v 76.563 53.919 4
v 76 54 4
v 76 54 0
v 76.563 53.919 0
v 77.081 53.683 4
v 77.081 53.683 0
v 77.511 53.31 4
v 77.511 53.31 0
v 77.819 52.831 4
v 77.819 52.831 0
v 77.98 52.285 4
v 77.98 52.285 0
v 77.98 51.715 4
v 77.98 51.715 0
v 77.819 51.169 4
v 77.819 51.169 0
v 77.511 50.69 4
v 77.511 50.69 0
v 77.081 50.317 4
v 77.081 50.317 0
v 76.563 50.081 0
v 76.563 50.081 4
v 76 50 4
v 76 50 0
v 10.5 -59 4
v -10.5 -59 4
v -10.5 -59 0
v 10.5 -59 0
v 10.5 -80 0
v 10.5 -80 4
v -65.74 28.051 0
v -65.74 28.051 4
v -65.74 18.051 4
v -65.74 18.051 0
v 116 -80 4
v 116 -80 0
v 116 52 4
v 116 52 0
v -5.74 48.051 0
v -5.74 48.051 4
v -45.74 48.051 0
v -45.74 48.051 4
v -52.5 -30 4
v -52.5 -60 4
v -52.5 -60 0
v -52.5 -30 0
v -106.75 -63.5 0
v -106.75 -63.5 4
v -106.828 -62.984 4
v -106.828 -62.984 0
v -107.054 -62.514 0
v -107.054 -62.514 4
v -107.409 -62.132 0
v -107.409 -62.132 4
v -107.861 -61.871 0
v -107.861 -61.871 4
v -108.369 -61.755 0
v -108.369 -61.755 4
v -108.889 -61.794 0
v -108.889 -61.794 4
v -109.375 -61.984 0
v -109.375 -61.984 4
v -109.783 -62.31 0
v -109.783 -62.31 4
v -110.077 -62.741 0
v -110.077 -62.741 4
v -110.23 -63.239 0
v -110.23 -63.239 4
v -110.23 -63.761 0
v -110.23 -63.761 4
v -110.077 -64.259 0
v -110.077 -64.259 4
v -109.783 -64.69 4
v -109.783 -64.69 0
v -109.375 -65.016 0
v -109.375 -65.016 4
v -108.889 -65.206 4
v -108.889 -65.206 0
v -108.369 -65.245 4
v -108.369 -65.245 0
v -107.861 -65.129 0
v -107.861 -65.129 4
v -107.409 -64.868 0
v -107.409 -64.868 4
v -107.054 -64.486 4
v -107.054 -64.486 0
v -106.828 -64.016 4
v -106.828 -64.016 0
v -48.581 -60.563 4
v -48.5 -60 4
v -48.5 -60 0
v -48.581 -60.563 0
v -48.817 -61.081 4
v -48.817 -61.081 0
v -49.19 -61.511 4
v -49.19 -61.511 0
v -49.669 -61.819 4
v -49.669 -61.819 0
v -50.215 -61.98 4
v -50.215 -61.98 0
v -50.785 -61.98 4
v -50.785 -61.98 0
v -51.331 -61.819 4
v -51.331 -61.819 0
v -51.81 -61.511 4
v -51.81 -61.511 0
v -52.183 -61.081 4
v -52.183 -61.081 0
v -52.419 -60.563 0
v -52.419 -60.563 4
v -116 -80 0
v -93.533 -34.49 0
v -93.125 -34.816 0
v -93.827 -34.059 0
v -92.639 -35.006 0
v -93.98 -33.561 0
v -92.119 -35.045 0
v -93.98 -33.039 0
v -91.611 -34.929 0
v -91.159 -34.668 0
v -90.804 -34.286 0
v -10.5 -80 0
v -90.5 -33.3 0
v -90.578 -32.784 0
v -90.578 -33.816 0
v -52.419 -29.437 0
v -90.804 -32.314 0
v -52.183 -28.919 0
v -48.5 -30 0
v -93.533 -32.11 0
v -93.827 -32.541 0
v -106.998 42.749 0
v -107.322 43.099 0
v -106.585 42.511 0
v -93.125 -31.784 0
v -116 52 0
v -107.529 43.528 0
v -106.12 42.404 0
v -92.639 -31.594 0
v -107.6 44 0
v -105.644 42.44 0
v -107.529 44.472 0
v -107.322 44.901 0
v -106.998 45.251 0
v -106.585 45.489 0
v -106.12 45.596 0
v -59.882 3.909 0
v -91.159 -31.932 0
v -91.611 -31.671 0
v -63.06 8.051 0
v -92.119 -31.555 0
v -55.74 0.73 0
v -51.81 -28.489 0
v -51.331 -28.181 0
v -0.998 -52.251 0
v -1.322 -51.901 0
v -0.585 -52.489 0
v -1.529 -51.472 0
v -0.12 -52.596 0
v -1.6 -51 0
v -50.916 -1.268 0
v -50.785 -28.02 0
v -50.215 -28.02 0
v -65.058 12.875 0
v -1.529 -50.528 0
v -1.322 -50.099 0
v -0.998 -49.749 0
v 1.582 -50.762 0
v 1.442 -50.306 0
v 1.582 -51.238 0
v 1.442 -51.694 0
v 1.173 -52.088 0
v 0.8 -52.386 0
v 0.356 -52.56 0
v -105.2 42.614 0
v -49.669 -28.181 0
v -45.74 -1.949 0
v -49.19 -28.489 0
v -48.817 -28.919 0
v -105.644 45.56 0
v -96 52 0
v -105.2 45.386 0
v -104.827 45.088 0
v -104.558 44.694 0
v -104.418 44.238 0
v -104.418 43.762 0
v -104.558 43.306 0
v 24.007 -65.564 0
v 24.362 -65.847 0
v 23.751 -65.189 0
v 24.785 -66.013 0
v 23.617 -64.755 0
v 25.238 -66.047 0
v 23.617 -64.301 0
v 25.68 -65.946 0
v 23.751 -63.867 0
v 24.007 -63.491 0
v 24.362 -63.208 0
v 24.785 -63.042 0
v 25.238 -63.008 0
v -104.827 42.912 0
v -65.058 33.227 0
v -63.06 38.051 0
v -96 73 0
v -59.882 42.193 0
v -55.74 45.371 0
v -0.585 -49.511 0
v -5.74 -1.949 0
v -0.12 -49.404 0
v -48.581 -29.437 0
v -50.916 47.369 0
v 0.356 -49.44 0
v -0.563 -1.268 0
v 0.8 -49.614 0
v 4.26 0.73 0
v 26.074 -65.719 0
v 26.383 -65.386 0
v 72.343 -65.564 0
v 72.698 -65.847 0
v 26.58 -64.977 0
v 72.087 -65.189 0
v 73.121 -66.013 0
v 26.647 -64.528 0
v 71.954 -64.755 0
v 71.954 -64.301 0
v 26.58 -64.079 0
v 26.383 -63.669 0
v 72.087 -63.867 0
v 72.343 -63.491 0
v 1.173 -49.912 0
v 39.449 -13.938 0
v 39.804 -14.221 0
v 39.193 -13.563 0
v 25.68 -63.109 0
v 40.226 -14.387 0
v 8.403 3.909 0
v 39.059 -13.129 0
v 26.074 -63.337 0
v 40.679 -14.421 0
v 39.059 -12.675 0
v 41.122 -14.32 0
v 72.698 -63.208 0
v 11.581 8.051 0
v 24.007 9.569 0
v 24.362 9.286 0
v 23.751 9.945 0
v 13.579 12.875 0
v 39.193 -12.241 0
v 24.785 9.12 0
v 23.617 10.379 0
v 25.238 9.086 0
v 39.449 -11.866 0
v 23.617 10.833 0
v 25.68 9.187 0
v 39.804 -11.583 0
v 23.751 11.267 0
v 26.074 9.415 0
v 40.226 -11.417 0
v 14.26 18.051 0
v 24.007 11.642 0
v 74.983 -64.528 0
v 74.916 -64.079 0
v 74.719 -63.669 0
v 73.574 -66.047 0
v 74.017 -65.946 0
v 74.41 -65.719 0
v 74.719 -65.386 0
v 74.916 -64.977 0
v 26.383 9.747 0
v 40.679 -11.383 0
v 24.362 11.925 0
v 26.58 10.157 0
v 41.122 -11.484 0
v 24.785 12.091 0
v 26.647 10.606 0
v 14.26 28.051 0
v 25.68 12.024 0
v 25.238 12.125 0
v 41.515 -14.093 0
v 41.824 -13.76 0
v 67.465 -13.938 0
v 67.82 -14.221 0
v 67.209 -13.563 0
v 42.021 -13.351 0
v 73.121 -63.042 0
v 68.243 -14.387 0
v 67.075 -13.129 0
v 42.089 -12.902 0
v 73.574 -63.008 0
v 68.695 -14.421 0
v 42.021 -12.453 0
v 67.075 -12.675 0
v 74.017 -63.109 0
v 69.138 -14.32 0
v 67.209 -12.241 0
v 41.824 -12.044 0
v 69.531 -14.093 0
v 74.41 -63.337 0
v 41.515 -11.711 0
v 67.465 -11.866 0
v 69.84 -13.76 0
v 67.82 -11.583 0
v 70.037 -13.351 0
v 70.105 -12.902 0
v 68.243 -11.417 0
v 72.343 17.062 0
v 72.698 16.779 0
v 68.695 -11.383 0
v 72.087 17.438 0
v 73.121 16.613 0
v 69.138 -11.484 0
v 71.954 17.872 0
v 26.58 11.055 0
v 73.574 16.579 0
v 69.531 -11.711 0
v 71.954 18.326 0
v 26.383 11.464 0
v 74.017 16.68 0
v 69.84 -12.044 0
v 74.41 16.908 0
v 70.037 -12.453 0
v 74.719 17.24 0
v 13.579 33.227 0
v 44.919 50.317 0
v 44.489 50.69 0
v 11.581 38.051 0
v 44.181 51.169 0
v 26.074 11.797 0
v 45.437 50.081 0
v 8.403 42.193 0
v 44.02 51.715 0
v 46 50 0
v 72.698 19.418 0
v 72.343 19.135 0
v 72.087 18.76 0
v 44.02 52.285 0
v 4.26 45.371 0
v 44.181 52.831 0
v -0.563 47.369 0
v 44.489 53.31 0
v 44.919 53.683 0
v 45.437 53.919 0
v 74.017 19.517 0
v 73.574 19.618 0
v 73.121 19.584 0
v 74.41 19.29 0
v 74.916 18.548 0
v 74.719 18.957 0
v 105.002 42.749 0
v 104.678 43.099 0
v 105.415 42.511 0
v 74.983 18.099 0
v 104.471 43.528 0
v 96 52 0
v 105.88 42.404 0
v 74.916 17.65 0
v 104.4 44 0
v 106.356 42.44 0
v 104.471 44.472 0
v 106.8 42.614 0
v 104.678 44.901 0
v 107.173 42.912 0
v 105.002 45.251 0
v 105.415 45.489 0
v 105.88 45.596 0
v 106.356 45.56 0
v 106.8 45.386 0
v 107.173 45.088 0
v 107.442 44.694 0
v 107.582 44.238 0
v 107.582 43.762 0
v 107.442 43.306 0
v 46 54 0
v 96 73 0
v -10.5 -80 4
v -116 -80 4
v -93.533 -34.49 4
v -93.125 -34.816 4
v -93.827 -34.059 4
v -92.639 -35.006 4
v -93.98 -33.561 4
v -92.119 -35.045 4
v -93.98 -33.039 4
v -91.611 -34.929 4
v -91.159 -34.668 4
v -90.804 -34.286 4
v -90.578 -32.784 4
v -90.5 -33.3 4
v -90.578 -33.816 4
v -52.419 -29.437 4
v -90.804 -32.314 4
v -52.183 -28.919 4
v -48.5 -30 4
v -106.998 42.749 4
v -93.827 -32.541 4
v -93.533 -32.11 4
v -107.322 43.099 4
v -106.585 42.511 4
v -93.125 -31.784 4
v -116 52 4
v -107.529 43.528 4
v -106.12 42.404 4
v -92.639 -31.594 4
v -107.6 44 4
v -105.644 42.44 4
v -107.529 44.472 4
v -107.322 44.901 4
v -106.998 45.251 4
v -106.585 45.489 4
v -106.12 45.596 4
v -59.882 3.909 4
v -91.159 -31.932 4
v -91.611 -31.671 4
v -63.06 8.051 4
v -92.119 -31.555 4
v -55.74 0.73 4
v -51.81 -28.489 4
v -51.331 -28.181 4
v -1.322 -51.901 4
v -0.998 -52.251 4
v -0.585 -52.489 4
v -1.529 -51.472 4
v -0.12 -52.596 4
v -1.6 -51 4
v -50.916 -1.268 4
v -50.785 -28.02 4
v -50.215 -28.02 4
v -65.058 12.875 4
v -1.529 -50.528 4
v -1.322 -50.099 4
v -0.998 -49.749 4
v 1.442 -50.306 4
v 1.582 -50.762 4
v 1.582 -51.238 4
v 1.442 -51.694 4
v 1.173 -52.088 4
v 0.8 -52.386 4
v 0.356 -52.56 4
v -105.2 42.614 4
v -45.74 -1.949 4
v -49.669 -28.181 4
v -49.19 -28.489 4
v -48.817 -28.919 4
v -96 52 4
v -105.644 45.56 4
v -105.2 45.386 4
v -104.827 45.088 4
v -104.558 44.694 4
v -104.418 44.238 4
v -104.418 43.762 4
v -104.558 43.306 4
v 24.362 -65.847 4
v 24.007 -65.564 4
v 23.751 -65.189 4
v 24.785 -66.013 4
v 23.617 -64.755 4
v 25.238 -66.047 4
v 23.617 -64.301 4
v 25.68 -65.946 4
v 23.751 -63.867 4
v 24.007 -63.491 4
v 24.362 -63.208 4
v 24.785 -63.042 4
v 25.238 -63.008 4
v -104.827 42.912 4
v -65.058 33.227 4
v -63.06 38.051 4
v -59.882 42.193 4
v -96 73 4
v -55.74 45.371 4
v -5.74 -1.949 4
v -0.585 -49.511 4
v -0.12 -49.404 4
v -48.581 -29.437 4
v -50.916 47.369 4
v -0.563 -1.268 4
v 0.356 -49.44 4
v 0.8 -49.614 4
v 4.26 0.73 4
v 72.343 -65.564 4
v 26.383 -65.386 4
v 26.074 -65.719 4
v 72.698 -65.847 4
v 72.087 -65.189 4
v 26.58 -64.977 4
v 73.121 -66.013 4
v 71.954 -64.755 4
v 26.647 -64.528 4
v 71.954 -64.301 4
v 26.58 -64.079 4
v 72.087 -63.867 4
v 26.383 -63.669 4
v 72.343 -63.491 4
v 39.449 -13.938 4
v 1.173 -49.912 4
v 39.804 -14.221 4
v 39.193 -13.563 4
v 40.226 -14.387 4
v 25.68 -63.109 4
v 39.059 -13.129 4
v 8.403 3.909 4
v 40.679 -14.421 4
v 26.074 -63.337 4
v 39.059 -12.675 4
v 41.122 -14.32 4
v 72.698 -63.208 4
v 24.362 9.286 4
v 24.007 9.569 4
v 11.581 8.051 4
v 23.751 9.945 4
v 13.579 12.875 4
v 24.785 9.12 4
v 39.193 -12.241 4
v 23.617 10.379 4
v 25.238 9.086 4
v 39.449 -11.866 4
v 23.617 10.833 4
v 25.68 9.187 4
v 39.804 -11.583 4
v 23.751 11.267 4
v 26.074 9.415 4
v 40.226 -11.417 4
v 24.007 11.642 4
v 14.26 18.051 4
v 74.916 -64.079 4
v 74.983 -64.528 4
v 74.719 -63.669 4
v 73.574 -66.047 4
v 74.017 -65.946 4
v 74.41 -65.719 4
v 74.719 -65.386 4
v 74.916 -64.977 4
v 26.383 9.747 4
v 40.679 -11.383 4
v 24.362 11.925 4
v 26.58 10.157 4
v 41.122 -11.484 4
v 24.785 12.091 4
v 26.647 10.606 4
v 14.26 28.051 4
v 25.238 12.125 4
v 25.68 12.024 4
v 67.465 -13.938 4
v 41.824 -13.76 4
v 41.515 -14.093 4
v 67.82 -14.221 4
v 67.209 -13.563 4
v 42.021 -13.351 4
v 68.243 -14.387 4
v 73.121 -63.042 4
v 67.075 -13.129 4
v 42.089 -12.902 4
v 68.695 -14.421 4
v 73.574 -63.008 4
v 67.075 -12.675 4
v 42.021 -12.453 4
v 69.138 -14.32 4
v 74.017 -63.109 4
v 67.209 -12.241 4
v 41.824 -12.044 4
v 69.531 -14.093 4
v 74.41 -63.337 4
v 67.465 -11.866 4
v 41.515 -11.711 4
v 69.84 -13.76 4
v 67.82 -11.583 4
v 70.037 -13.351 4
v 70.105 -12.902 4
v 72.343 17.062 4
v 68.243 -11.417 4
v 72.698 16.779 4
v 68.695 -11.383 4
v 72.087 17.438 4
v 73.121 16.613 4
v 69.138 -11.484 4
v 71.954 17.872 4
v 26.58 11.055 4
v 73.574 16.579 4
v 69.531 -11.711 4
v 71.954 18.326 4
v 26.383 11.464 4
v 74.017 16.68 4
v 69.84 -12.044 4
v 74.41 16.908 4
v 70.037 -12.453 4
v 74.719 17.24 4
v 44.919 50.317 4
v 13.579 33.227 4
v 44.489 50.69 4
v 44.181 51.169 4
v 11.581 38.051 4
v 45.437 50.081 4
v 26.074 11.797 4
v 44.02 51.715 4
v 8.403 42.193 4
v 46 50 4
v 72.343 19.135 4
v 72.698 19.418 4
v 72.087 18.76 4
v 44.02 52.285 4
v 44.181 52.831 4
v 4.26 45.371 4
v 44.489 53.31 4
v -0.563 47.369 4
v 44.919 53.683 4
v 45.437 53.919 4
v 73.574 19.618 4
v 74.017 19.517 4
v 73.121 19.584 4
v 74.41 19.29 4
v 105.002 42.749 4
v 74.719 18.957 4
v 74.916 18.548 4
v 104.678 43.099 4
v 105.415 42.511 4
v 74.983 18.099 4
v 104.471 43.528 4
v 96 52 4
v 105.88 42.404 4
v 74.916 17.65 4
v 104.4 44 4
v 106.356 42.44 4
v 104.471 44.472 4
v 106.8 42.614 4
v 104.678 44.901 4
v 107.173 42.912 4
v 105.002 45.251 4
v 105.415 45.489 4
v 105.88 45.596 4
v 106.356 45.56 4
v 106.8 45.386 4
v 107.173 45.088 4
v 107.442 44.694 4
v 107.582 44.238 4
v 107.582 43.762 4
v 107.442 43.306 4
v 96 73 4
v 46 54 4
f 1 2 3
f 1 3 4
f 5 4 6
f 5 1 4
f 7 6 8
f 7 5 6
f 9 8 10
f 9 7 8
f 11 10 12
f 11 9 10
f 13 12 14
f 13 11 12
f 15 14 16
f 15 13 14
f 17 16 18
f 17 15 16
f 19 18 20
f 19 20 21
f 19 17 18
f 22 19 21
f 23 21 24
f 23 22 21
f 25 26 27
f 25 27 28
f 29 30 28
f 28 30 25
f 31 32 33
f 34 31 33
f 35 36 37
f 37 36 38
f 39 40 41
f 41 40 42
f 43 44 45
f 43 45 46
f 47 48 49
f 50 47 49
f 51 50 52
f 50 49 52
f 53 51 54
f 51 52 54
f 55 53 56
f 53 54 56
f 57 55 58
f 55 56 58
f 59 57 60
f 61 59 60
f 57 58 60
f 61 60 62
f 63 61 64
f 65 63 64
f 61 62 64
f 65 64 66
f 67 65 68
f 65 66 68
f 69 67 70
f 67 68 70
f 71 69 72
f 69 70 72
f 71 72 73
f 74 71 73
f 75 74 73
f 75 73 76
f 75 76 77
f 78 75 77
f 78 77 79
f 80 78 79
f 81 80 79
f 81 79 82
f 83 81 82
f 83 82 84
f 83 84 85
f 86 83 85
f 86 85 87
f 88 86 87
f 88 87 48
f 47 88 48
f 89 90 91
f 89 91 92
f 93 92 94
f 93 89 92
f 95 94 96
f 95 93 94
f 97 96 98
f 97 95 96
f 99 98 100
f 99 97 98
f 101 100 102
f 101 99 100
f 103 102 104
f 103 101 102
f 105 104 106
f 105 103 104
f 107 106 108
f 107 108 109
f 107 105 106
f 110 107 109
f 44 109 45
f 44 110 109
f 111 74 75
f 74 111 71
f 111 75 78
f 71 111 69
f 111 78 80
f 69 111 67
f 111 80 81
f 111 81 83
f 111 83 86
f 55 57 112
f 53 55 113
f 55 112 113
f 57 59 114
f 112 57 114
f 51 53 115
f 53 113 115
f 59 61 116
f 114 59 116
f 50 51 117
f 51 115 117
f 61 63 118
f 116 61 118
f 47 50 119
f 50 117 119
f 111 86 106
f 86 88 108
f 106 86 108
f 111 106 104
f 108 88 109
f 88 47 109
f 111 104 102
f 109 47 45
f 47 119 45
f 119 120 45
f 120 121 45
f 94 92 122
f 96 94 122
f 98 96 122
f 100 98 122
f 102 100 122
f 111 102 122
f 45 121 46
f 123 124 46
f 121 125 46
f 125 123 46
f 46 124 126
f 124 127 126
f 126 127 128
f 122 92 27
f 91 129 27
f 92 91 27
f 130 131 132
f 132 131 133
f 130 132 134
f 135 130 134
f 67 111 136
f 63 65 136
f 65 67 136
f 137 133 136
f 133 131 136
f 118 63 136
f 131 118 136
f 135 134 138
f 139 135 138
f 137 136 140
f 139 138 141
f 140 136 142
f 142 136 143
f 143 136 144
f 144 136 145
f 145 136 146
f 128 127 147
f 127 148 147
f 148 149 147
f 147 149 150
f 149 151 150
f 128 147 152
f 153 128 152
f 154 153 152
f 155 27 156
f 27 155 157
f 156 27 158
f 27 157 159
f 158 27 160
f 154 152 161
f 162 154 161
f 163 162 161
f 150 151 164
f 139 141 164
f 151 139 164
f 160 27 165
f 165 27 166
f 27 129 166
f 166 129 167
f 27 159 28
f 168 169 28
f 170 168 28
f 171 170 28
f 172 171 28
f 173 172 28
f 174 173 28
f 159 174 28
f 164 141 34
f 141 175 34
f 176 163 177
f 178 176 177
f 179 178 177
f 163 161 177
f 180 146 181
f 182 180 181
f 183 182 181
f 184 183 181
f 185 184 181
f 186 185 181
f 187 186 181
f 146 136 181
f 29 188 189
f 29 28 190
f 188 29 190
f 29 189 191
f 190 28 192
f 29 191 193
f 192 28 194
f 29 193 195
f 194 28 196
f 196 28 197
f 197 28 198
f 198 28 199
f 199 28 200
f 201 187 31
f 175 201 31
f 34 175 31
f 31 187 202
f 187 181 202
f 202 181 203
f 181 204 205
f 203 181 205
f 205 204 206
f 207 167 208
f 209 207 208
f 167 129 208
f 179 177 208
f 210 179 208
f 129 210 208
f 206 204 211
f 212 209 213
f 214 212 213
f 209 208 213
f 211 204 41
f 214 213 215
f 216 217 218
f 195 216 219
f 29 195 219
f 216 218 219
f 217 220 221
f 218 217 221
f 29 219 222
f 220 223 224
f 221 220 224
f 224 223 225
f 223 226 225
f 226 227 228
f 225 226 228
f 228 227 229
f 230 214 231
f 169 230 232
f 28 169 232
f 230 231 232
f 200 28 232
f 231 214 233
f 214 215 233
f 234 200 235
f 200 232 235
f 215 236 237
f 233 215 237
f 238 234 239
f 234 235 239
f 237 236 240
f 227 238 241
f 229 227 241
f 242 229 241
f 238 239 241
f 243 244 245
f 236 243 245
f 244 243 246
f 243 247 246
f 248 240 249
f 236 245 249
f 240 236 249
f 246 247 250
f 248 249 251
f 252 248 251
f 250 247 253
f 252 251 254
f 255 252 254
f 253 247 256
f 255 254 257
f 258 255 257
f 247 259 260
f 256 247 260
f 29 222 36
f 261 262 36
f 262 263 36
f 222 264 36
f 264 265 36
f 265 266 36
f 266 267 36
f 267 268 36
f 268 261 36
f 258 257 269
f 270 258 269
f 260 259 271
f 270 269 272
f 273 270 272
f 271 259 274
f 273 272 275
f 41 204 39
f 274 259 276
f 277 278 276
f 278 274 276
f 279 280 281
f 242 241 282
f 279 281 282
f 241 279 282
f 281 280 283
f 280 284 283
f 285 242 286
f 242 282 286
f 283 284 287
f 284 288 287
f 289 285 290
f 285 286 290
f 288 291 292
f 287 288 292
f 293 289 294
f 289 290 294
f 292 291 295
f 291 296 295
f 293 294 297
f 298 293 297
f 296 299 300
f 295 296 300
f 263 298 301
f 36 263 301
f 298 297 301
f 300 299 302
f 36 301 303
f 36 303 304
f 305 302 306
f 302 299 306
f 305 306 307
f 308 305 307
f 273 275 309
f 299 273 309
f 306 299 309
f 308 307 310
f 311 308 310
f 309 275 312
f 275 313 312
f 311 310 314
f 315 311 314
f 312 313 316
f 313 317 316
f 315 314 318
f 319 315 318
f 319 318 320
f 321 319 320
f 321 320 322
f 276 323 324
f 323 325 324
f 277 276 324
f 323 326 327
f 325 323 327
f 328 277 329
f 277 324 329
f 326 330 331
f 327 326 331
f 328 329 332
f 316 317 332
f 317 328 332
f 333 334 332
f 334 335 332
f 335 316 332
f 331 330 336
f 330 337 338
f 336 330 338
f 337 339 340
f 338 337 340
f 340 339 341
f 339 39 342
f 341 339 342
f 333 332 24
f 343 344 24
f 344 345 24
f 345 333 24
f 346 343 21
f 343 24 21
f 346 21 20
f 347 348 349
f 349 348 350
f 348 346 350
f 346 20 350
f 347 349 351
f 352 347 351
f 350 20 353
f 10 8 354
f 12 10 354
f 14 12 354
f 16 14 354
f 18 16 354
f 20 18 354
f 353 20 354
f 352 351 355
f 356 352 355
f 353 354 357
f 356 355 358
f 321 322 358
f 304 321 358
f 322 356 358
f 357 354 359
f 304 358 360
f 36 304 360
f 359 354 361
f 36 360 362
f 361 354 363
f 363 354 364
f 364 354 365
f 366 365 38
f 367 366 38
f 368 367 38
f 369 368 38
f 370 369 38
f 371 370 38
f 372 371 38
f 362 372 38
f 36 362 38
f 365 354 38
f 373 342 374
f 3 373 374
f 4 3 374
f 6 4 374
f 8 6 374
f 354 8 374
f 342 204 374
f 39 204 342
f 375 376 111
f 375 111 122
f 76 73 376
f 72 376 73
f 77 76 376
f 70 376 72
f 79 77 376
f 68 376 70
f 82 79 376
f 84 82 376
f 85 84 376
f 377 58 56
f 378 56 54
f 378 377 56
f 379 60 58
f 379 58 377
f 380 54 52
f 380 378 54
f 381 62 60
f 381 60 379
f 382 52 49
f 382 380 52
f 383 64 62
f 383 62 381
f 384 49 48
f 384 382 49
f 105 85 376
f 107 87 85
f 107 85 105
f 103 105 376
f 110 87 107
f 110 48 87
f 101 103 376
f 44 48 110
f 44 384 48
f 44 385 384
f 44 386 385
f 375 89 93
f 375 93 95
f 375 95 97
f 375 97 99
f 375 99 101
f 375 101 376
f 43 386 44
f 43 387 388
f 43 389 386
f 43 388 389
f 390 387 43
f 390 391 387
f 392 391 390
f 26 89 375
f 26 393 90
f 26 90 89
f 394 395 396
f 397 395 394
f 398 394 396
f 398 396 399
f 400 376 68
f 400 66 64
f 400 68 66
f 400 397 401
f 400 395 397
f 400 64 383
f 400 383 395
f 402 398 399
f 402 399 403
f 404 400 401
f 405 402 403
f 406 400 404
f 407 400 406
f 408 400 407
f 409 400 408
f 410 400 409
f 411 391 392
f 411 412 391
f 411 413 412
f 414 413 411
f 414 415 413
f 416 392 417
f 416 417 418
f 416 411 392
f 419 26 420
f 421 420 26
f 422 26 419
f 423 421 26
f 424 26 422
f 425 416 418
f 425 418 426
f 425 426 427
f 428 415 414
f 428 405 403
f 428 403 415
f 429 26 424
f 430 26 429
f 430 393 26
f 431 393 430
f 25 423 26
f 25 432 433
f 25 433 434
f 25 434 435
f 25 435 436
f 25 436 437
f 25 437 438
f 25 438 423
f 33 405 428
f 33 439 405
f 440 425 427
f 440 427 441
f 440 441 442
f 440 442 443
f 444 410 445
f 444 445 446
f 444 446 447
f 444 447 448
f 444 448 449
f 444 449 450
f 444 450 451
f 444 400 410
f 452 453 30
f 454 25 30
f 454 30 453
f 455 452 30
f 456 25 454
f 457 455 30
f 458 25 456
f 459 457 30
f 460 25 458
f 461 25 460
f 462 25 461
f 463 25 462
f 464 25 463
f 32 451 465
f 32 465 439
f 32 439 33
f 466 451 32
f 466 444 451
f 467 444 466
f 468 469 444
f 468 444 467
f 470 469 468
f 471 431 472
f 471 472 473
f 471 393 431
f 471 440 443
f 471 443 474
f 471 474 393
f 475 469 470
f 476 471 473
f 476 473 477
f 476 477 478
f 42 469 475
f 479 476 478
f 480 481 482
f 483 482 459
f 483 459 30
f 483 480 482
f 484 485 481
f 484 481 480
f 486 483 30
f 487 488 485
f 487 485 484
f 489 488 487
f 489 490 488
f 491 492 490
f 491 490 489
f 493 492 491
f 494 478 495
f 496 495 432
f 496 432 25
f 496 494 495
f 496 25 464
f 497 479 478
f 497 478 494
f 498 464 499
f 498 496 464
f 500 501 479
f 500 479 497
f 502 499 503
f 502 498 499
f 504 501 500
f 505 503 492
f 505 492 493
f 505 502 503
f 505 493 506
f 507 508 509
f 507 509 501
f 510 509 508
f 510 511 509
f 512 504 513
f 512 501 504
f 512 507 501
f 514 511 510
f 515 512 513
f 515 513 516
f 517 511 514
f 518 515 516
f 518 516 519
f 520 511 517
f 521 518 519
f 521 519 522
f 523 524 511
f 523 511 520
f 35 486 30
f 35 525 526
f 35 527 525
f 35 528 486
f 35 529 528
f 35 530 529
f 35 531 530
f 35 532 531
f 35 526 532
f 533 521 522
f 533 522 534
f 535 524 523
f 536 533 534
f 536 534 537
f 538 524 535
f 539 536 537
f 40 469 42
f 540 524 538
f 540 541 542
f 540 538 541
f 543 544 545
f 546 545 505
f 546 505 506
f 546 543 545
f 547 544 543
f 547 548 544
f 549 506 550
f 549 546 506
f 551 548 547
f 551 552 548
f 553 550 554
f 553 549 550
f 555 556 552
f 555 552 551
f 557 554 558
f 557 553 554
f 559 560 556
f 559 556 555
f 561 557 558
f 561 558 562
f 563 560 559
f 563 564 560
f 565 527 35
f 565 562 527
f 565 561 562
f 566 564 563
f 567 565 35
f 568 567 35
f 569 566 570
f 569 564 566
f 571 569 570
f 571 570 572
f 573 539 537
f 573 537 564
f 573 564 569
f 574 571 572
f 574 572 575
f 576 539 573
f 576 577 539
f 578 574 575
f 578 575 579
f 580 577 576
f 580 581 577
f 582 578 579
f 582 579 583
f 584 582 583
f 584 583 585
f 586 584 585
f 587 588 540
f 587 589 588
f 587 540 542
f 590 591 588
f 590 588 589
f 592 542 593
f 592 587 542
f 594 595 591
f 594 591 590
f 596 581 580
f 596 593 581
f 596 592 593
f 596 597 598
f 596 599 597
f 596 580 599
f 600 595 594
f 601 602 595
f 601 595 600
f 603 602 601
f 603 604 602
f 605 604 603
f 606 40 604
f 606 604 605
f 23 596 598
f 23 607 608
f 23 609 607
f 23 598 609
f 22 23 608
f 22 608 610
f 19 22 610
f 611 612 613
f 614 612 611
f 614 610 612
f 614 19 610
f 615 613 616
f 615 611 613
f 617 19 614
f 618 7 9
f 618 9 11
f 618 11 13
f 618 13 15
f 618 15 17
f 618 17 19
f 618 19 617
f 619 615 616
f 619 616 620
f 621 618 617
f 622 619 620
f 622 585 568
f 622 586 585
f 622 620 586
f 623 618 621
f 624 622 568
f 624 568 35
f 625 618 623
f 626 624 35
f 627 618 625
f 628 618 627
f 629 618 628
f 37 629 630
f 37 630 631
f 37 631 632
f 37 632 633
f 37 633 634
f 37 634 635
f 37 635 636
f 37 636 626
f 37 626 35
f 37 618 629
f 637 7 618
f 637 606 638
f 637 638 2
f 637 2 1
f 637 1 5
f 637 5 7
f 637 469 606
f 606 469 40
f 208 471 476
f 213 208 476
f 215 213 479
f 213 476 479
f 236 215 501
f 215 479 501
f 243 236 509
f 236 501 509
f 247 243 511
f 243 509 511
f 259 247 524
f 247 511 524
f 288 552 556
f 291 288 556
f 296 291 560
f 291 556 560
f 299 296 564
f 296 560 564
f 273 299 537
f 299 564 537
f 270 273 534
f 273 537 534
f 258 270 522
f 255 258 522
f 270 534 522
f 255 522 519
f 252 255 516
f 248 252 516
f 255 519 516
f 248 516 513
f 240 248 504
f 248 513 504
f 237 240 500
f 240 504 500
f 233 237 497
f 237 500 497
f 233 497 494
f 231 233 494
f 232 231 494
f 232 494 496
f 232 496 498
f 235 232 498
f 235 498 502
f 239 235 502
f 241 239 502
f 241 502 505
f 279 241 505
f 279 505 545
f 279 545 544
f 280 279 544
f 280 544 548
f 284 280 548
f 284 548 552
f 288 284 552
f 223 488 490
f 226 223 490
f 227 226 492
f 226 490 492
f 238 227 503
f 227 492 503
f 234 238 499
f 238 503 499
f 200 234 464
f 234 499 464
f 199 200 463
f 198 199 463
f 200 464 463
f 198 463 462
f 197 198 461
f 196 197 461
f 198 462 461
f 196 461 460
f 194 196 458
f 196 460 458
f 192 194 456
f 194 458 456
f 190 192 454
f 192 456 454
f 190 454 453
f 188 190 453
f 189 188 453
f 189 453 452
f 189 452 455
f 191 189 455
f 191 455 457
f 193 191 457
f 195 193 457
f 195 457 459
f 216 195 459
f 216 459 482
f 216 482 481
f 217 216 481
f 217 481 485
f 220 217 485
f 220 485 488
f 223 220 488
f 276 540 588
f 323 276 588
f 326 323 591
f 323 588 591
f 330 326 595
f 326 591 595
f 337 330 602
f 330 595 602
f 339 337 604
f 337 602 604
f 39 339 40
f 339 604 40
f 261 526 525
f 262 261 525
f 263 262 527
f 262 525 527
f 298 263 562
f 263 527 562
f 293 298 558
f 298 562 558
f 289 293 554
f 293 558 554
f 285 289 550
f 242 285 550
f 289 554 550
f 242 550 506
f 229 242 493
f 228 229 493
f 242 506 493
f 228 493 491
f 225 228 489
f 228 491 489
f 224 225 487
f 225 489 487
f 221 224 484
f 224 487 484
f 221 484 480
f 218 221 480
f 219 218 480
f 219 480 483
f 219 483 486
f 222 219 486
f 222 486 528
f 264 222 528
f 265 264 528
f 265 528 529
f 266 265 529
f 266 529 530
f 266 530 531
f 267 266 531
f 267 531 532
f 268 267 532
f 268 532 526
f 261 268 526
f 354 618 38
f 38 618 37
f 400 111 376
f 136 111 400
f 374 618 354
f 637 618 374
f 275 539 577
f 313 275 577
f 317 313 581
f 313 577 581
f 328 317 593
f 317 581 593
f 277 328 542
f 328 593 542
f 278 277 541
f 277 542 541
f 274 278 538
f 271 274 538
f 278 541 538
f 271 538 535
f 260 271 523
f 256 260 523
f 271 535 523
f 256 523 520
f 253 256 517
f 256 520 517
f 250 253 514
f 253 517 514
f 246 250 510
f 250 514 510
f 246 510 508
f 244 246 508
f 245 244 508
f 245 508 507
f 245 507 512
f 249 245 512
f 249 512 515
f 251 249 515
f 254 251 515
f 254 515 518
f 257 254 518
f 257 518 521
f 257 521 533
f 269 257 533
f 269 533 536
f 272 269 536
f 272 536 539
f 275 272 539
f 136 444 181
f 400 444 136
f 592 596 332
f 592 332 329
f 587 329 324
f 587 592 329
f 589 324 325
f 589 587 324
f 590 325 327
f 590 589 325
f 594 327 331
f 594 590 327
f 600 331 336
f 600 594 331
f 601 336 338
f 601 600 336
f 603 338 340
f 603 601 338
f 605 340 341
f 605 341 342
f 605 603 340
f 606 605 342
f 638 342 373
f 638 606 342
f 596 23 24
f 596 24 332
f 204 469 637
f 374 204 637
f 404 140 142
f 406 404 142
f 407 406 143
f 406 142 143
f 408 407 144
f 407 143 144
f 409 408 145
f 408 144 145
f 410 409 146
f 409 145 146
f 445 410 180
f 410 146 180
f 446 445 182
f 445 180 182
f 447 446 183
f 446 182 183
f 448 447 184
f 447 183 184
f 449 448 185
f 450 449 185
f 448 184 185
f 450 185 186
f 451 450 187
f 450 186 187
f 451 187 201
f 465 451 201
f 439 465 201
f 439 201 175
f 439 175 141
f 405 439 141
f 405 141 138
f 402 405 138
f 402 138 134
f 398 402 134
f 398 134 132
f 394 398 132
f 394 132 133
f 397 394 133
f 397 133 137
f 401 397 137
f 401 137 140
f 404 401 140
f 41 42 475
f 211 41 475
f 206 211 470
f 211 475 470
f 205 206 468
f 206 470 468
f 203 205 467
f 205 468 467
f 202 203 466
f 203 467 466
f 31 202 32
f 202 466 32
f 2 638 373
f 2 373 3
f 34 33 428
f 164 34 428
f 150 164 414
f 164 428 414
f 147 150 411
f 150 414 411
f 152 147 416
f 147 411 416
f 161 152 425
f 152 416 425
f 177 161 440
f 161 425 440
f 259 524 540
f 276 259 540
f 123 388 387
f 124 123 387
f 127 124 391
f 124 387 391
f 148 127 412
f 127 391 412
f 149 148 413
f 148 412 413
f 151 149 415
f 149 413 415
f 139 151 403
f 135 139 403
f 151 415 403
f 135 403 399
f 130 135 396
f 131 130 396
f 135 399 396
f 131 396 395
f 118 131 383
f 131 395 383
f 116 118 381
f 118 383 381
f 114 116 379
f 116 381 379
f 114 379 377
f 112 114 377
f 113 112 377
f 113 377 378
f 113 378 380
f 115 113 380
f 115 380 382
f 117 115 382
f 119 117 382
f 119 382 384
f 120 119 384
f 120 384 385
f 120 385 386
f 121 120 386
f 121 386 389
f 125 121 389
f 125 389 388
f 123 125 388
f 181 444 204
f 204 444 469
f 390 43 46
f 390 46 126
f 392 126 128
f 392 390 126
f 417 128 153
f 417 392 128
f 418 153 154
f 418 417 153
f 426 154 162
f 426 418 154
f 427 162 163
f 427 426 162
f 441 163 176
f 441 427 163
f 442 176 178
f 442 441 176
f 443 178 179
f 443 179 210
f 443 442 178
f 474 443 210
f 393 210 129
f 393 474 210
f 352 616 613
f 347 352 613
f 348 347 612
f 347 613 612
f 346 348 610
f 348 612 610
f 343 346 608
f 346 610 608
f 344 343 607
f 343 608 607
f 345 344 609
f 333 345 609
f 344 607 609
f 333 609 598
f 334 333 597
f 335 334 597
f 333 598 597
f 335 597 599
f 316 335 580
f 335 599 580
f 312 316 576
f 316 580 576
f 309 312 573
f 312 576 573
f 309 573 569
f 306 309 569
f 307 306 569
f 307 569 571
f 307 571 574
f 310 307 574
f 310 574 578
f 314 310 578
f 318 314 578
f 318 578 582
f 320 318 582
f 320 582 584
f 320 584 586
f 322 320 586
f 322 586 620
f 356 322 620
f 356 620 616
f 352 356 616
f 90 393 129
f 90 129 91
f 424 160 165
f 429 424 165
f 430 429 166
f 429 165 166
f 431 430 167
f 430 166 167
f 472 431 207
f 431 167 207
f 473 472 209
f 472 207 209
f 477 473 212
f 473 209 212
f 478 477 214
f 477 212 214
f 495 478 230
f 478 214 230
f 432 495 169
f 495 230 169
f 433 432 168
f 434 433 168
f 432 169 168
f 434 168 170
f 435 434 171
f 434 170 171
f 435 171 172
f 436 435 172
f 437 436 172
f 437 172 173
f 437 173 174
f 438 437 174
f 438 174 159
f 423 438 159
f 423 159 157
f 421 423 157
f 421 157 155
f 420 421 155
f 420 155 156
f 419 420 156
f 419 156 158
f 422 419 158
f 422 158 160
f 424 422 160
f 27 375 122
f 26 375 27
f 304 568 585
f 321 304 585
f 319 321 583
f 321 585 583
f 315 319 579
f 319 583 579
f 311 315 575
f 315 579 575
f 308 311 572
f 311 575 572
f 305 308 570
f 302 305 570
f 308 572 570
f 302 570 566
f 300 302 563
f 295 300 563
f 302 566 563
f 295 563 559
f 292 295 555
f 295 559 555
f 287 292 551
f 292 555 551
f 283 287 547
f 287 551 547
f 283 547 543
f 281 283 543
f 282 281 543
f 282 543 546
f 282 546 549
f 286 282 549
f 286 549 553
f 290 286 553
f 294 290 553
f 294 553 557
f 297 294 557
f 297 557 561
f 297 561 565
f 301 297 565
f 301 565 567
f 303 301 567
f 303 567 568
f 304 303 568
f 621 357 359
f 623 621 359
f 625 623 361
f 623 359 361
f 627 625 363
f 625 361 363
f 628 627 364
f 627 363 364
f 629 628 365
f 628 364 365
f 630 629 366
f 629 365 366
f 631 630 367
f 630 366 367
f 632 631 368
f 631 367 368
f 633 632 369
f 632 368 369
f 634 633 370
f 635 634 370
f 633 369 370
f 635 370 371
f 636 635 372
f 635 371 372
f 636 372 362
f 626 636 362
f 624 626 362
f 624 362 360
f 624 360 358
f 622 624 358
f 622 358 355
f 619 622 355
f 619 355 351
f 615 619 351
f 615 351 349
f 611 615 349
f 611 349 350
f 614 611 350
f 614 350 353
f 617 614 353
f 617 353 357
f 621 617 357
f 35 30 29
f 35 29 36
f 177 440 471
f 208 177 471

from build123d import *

# Parameters (mm, degrees)
SKETCH1_W           = 232
SKETCH1_H           = 170
BOSS_EXTRUDE1_DEPTH = 4
CUT_EXTRUDE4_DEPTH  = 144.864519601
SKETCH6_R           = 1.523418559
CUT_EXTRUDE5_DEPTH  = 144.864519601
SKETCH8_W           = 232
SKETCH8_H           = 5
CUT_EXTRUDE7_DEPTH  = 144.864519601
SKETCH9_R           = 1.6
CUT_EXTRUDE8_DEPTH  = 144.864519601
SKETCH10_R          = 1.75
CUT_EXTRUDE9_DEPTH  = 144.864519601
SKETCH11_W          = 20
SKETCH11_H          = 33
CUT_EXTRUDE10_DEPTH = 144.864519601
SKETCH12_W          = 21
SKETCH12_H          = 21
CUT_EXTRUDE11_DEPTH = 4
CUT_EXTRUDE12_DEPTH = 4
SKETCH14_W          = 192
SKETCH14_H          = 12
CUT_EXTRUDE13_DEPTH = 4


with BuildPart() as part:
    # Sketch1 → Boss-Extrude1 (new body)
    with BuildSketch(Plane.XY):
        Rectangle(SKETCH1_W, SKETCH1_H)
    extrude(amount=BOSS_EXTRUDE1_DEPTH)

    # Sketch5 → Cut-Extrude4 (cut, through all)
    with BuildSketch(Plane.XY.offset(4)):
        with BuildLine():
            Line((-45.739568187, -1.949021099), (-5.739568187, -1.949021099))
            ThreePointArc((-5.739568187, -1.949021099), (8.402567437, 3.908843277), (14.260431813, 18.050978901))
            Line((14.260431813, 18.050978901), (14.260431813, 28.050978901))
            ThreePointArc((14.260431813, 28.050978901), (8.402567437, 42.193114525), (-5.739568187, 48.050978901))
            Line((-5.739568187, 48.050978901), (-45.739568187, 48.050978901))
            ThreePointArc((-45.739568187, 48.050978901), (-59.881703811, 42.193114525), (-65.739568187, 28.050978901))
            Line((-65.739568187, 28.050978901), (-65.739568187, 18.050978901))
            ThreePointArc((-65.739568187, 18.050978901), (-59.881703811, 3.908843277), (-45.739568187, -1.949021099))
        make_face()
    extrude(amount=-CUT_EXTRUDE4_DEPTH, mode=Mode.SUBTRACT)

    # Sketch6 → Cut-Extrude5 (cut, through all)
    with BuildSketch(Plane.XY.offset(4)):
        with Locations((73.46, 18.098600008)):
            Circle(SKETCH6_R)
        with Locations((25.1238, 10.605600008)):
            Circle(SKETCH6_R)
        with Locations((68.581507234, -12.902099992)):
            Circle(SKETCH6_R)
        with Locations((40.565307234, -12.902099992)):
            Circle(SKETCH6_R)
        with Locations((73.46, -64.527599992)):
            Circle(SKETCH6_R)
        with Locations((25.1238, -64.527599992)):
            Circle(SKETCH6_R)
    extrude(amount=-CUT_EXTRUDE5_DEPTH, mode=Mode.SUBTRACT)

    # Sketch8 → Cut-Extrude7 (cut, through all)
    with BuildSketch(Plane.XY.offset(4)):
        with Locations((0, -82.5)):
            Rectangle(SKETCH8_W, SKETCH8_H)
    extrude(amount=-CUT_EXTRUDE7_DEPTH, mode=Mode.SUBTRACT)

    # Sketch9 → Cut-Extrude8 (cut, through all)
    with BuildSketch(Plane(origin=(0, 0, 0), x_dir=(-1, 0, 0), z_dir=(0, 0, -1))):
        with Locations((106, 44)):
            Circle(SKETCH9_R)
        with Locations((-106, 44)):
            Circle(SKETCH9_R)
        with Locations((0, -51.000000508)):
            Circle(SKETCH9_R)
    extrude(amount=-CUT_EXTRUDE8_DEPTH, mode=Mode.SUBTRACT)

    # Sketch10 → Cut-Extrude9 (cut, through all)
    with BuildSketch(Plane.XY.offset(4)):
        with Locations((-92.249999997, -33.300000021)):
            Circle(SKETCH10_R)
        with Locations((-108.499999997, -63.500000021)):
            Circle(SKETCH10_R)
    extrude(amount=-CUT_EXTRUDE9_DEPTH, mode=Mode.SUBTRACT)

    # Sketch11 → Cut-Extrude10 (cut, through all)
    with BuildSketch(Plane.XY.offset(4)):
        with Locations((106, 68.5)):
            Rectangle(SKETCH11_W, SKETCH11_H)
    cut_extrude10 = extrude(amount=-CUT_EXTRUDE10_DEPTH, mode=Mode.SUBTRACT)

    # Mirror1: Cut-Extrude10 across plane
    add(cut_extrude10.mirror(Plane.ZY), mode=Mode.SUBTRACT)

    # Sketch12 → Cut-Extrude11 (cut)
    with BuildSketch(Plane.XY.offset(4)):
        with Locations((0, -69.5)):
            Rectangle(SKETCH12_W, SKETCH12_H)
    extrude(amount=-CUT_EXTRUDE11_DEPTH, mode=Mode.SUBTRACT)

    # Sketch13 → Cut-Extrude12 (cut)
    with BuildSketch(Plane.XY.offset(4)):
        with BuildLine():
            Line((-48.5, -30), (-48.5, -60))
            ThreePointArc((-48.5, -60), (-50.5, -62), (-52.5, -60))
            Line((-52.5, -60), (-52.5, -30))
            ThreePointArc((-52.5, -30), (-50.5, -28), (-48.5, -30))
        make_face()
        with BuildLine():
            Line((46, 54), (76, 54))
            ThreePointArc((76, 54), (78, 52), (76, 50))
            Line((76, 50), (46, 50))
            ThreePointArc((46, 50), (44, 52), (46, 54))
        make_face()
    extrude(amount=-CUT_EXTRUDE12_DEPTH, mode=Mode.SUBTRACT)

    # Sketch14 → Cut-Extrude13 (cut)
    with BuildSketch(Plane.XY.offset(4)):
        with Locations((0, 79)):
            Rectangle(SKETCH14_W, SKETCH14_H)
    extrude(amount=-CUT_EXTRUDE13_DEPTH, mode=Mode.SUBTRACT)


solid = part.part
